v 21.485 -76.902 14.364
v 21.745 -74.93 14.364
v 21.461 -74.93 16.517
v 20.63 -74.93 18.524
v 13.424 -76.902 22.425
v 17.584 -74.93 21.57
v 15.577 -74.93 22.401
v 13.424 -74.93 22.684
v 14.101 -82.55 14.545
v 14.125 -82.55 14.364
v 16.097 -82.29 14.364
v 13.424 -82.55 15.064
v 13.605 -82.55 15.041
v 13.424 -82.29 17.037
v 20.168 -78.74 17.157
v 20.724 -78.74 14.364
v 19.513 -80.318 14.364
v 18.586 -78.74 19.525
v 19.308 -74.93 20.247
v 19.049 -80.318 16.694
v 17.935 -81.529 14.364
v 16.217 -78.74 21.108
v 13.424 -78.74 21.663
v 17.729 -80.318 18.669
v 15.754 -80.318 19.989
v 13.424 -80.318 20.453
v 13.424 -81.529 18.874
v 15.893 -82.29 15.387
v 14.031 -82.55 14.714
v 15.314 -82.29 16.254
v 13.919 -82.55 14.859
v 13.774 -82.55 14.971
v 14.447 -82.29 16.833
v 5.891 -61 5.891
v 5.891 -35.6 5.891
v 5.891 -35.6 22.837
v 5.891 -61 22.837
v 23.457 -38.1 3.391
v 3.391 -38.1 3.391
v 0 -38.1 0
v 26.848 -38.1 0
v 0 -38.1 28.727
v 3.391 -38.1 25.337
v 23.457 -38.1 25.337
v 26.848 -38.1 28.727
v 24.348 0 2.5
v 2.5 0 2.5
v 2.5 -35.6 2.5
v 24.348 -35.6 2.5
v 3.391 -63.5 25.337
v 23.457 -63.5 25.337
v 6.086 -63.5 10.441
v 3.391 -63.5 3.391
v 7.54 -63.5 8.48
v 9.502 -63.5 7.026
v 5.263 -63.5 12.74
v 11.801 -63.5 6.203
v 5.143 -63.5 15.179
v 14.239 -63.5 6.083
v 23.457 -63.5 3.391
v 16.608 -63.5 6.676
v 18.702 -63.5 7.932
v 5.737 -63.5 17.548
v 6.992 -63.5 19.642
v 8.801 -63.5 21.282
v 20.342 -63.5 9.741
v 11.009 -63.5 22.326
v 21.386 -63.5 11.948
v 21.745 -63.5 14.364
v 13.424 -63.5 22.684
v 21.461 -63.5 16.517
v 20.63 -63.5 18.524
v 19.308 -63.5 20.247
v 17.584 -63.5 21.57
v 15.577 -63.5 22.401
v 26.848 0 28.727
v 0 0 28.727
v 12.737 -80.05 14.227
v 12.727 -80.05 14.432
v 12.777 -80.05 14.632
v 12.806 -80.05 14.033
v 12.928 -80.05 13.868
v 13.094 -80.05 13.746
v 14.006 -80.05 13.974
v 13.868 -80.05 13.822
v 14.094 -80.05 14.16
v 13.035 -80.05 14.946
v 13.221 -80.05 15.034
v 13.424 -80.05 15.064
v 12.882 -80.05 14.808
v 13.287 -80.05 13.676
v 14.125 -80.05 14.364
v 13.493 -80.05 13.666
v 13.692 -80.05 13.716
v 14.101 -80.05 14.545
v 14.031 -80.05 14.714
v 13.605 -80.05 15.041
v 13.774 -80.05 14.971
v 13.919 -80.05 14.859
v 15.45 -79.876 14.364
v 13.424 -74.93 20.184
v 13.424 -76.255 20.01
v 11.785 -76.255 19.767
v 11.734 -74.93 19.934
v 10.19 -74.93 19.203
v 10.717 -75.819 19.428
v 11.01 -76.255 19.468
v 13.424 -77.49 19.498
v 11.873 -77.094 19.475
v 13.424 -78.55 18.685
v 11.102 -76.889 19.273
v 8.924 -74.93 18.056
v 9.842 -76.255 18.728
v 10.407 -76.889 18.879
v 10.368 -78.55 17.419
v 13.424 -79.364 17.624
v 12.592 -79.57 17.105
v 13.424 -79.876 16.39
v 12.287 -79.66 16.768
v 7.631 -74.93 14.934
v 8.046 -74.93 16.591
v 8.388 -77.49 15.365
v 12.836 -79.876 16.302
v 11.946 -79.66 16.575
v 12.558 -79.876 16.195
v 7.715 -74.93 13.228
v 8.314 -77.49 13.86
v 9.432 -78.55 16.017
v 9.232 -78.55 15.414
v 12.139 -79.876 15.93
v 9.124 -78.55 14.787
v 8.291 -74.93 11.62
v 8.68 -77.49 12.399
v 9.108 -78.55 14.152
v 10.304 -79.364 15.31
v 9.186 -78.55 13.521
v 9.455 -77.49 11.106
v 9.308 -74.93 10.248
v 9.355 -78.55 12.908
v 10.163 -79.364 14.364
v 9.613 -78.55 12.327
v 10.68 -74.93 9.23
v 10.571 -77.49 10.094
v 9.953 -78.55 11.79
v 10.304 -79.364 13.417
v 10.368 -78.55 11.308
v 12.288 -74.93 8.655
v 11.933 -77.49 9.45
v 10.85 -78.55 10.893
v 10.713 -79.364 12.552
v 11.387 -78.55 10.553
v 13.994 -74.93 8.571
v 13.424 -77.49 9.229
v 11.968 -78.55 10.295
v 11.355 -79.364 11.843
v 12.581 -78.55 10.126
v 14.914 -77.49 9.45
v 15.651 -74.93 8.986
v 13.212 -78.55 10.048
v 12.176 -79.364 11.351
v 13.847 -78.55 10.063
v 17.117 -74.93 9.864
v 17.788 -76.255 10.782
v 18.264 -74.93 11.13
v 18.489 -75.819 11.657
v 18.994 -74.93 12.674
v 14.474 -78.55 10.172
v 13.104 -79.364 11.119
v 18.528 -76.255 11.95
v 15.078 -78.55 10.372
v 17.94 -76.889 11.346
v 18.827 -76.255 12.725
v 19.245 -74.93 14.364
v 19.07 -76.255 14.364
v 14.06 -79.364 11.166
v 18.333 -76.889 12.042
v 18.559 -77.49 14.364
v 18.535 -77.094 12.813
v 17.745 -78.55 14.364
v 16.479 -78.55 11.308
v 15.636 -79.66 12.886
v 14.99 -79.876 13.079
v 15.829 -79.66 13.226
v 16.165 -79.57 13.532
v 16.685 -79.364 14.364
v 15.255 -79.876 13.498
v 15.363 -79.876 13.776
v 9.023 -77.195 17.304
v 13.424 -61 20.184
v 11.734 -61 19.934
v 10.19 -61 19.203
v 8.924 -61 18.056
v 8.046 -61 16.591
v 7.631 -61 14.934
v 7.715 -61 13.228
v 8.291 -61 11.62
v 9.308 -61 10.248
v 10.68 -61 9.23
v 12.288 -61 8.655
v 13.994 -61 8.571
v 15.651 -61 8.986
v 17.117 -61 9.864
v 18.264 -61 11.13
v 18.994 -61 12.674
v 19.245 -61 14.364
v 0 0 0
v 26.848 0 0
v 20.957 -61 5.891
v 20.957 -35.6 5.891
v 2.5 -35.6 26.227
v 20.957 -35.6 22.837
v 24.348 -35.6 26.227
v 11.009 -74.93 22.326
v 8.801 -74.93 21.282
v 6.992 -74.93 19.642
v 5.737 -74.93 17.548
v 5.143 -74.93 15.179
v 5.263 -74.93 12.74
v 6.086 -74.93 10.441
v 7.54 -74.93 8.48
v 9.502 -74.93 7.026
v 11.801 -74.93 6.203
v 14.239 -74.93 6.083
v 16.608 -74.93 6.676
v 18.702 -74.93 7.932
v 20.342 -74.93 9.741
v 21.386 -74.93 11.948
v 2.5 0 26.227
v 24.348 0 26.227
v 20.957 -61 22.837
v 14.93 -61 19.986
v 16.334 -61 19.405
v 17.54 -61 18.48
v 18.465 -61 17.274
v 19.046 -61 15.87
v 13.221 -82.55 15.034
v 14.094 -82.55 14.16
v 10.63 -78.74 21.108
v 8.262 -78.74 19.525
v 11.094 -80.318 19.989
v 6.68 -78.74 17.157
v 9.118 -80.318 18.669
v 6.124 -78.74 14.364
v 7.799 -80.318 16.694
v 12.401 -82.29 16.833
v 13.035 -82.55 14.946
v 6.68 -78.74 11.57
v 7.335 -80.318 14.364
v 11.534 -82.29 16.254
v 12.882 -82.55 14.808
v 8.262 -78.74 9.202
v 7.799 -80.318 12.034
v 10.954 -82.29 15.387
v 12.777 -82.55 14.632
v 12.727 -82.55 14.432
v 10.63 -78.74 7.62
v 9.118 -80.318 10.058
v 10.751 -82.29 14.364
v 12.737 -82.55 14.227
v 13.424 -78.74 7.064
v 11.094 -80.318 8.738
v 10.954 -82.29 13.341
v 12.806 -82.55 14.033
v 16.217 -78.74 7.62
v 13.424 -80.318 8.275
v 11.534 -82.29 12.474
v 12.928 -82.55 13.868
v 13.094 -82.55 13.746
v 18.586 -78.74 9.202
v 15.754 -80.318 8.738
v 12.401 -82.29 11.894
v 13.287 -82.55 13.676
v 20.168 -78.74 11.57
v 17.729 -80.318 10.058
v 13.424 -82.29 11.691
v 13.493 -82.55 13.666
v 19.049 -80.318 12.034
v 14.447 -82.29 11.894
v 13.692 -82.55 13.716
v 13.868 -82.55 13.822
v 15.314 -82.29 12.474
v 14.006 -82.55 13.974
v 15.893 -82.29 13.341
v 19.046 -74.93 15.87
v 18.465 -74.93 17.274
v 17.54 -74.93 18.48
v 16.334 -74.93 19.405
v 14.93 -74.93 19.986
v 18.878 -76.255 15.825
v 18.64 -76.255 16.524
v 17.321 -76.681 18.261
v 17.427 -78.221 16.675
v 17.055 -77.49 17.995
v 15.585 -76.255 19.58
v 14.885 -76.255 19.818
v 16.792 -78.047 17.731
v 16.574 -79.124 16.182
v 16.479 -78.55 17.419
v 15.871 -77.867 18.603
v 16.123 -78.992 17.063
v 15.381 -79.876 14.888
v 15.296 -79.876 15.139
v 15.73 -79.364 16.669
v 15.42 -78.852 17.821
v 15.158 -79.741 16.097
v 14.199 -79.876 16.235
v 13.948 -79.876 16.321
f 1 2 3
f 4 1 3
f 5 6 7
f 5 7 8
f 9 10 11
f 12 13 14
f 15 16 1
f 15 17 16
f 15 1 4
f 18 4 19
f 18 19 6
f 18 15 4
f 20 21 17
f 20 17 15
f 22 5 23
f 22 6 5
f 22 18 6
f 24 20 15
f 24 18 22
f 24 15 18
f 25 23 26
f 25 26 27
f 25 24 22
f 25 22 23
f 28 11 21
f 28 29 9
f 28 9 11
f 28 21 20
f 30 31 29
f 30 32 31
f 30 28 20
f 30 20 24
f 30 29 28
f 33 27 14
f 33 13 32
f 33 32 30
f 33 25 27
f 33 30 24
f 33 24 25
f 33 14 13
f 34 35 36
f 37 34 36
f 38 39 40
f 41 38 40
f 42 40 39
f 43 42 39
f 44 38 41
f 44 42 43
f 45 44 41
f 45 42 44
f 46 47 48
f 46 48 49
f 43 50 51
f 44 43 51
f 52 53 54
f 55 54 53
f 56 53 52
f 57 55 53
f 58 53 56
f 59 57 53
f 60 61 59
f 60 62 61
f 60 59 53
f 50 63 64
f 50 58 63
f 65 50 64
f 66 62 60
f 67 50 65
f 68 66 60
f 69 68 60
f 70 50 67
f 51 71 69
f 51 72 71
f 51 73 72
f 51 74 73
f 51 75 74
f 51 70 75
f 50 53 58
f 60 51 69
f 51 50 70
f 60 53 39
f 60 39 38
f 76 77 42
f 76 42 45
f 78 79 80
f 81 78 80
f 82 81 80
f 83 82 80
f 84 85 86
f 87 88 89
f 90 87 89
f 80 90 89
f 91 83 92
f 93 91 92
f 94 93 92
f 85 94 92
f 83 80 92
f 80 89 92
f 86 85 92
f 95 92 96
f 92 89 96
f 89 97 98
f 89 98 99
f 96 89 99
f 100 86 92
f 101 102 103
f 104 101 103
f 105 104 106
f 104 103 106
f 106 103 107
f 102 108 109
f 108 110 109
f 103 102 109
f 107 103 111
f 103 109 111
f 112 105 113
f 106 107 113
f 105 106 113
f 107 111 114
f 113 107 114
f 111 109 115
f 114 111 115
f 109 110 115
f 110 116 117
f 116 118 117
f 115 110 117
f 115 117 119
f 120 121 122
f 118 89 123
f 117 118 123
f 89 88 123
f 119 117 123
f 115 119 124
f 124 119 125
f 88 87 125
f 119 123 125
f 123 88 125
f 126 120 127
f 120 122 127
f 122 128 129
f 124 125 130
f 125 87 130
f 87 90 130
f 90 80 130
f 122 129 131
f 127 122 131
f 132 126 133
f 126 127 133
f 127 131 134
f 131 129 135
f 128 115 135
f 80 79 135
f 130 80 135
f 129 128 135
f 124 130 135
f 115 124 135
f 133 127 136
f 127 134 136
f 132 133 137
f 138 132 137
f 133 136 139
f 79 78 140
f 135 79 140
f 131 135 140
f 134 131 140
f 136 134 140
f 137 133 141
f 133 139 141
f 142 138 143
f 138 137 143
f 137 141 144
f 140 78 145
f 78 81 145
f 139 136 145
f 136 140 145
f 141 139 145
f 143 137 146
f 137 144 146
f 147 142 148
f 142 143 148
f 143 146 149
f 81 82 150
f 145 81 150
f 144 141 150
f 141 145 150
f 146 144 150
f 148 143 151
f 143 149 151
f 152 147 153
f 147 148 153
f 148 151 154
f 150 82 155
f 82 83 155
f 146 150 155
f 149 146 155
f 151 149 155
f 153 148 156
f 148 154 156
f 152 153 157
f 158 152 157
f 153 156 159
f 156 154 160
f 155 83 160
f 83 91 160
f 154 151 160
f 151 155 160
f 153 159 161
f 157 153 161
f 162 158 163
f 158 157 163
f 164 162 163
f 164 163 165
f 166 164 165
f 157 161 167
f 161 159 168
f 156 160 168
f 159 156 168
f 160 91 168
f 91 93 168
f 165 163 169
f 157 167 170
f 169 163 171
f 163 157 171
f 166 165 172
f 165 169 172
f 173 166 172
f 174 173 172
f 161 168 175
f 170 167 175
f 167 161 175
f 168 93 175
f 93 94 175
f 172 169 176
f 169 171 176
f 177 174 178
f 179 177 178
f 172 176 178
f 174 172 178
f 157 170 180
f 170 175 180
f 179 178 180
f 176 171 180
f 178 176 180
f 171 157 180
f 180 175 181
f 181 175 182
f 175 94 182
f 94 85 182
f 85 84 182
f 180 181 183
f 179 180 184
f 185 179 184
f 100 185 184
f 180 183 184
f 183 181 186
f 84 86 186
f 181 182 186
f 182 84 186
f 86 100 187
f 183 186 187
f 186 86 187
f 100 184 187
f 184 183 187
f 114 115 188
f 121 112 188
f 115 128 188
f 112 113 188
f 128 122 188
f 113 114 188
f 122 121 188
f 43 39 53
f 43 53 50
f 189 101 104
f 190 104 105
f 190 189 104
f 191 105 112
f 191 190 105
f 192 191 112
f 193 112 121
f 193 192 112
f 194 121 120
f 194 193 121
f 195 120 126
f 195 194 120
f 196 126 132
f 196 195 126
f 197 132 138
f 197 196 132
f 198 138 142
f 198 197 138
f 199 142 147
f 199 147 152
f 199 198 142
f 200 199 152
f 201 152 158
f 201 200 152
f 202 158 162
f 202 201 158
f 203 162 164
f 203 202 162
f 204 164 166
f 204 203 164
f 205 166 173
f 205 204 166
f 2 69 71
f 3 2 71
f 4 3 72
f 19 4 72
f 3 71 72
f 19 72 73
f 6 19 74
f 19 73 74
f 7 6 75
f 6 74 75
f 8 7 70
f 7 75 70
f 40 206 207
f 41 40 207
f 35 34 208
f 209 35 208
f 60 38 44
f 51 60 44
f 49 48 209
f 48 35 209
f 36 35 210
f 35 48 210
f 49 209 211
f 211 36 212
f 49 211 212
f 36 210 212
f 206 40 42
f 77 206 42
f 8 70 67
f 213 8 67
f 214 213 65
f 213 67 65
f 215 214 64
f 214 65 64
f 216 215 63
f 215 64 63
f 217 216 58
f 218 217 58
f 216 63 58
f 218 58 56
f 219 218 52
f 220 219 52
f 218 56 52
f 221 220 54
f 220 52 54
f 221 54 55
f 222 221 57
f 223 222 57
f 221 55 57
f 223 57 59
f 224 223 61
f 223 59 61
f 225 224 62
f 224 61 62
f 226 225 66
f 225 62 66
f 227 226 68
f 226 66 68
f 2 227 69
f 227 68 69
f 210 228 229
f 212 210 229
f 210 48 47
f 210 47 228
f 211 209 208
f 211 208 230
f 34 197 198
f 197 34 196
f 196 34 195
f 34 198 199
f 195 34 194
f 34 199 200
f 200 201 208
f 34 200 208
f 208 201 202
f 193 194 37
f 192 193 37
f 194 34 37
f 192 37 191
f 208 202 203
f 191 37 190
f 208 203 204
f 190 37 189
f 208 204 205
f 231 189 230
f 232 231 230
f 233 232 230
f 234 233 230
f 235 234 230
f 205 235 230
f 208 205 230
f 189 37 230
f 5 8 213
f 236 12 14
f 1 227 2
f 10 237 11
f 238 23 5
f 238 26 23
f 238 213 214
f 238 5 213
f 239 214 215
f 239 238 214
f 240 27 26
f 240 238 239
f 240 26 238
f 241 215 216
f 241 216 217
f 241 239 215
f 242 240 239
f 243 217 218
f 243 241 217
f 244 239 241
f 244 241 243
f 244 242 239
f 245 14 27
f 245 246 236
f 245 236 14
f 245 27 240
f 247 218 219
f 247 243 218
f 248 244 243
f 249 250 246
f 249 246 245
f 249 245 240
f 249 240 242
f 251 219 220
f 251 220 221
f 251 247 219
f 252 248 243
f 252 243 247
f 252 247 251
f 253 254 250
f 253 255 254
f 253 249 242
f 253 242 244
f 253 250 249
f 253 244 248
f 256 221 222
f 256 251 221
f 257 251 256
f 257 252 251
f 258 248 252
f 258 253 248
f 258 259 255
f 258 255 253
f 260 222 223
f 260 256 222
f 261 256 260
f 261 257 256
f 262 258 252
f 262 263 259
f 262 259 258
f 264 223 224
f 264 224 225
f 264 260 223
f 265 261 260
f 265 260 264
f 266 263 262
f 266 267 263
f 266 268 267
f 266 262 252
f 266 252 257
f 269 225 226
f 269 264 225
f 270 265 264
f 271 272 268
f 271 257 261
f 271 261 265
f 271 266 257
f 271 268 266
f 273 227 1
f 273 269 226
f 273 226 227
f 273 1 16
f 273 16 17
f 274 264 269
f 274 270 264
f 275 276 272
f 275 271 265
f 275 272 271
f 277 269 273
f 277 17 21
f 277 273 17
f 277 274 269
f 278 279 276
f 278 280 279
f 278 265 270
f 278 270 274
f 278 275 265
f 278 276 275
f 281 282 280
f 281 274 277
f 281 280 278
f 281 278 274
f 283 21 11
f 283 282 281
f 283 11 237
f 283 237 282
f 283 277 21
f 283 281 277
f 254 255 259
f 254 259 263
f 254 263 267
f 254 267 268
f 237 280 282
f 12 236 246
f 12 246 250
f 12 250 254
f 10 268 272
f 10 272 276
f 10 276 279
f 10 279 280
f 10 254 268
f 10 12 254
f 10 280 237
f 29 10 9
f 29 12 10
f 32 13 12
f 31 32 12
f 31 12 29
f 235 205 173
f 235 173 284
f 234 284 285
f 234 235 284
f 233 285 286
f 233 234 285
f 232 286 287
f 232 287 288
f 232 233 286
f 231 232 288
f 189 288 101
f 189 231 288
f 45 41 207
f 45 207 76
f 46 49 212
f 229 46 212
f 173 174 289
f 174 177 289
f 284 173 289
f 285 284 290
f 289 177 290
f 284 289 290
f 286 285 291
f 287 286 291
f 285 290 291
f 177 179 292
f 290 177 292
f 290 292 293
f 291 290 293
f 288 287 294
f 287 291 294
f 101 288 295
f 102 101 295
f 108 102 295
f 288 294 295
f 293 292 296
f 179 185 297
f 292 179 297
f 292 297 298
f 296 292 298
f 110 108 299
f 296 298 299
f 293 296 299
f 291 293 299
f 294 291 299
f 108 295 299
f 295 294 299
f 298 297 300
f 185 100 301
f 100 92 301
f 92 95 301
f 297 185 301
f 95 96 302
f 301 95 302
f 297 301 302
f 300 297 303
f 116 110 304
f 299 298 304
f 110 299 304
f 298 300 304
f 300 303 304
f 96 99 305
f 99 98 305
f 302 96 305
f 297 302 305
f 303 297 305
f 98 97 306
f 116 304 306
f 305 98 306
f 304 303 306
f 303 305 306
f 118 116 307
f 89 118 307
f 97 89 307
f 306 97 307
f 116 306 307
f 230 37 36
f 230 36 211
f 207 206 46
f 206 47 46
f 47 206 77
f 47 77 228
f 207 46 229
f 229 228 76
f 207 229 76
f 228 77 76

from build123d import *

# Parameters (mm, degrees)
F0_W     = 26.8478
F0_H     = 28.7274
F1_DEPTH = 38.1
F2_W     = 20.0660005145
F2_H     = 21.9456005145
F3_DEPTH = 25.4
F5_DEPTH = 19.05
F6_R     = 7.62
F7_T     = -2.5


with BuildPart() as f1:
    # F0 (on Front) → F1 (new body)
    with BuildSketch(Plane.XZ):
        with Locations((13.4239, 14.3637)):
            Rectangle(F0_W, F0_H)
    extrude(amount=F1_DEPTH)

    # F2 (on face) → F3 (join)
    with BuildSketch(Plane.XZ.offset(38.1)):
        with Locations((13.4239, 14.3637)):
            Rectangle(F2_W, F2_H)
    extrude(amount=F3_DEPTH)

    # F4 (on face) → F5 (join)
    with BuildSketch(Plane.XZ.offset(63.5)):
        with BuildLine():
            ThreePointArc((21.7445834799, 14.3637), (19.3075117128, 20.2473117128), (13.4239, 22.6843834799))
            ThreePointArc((13.4239, 22.6843834799), (7.5402882872, 8.4800882872), (21.7445834799, 14.3637))
        make_face()
    extrude(amount=F5_DEPTH)

    # F6
    f6_edges = [f1.edges().sort_by_distance(p)[0] for p in [
        (5.103217, -82.55, 14.3637),
    ]]
    fillet(f6_edges, radius=F6_R)

    # F7
    f7_openings = [f1.faces().sort_by_distance(p)[0] for p in [
        (13.4239, 0, 14.3637),
    ]]
    offset(amount=F7_T, openings=f7_openings, kind=Kind.INTERSECTION)


solid = f1.part
